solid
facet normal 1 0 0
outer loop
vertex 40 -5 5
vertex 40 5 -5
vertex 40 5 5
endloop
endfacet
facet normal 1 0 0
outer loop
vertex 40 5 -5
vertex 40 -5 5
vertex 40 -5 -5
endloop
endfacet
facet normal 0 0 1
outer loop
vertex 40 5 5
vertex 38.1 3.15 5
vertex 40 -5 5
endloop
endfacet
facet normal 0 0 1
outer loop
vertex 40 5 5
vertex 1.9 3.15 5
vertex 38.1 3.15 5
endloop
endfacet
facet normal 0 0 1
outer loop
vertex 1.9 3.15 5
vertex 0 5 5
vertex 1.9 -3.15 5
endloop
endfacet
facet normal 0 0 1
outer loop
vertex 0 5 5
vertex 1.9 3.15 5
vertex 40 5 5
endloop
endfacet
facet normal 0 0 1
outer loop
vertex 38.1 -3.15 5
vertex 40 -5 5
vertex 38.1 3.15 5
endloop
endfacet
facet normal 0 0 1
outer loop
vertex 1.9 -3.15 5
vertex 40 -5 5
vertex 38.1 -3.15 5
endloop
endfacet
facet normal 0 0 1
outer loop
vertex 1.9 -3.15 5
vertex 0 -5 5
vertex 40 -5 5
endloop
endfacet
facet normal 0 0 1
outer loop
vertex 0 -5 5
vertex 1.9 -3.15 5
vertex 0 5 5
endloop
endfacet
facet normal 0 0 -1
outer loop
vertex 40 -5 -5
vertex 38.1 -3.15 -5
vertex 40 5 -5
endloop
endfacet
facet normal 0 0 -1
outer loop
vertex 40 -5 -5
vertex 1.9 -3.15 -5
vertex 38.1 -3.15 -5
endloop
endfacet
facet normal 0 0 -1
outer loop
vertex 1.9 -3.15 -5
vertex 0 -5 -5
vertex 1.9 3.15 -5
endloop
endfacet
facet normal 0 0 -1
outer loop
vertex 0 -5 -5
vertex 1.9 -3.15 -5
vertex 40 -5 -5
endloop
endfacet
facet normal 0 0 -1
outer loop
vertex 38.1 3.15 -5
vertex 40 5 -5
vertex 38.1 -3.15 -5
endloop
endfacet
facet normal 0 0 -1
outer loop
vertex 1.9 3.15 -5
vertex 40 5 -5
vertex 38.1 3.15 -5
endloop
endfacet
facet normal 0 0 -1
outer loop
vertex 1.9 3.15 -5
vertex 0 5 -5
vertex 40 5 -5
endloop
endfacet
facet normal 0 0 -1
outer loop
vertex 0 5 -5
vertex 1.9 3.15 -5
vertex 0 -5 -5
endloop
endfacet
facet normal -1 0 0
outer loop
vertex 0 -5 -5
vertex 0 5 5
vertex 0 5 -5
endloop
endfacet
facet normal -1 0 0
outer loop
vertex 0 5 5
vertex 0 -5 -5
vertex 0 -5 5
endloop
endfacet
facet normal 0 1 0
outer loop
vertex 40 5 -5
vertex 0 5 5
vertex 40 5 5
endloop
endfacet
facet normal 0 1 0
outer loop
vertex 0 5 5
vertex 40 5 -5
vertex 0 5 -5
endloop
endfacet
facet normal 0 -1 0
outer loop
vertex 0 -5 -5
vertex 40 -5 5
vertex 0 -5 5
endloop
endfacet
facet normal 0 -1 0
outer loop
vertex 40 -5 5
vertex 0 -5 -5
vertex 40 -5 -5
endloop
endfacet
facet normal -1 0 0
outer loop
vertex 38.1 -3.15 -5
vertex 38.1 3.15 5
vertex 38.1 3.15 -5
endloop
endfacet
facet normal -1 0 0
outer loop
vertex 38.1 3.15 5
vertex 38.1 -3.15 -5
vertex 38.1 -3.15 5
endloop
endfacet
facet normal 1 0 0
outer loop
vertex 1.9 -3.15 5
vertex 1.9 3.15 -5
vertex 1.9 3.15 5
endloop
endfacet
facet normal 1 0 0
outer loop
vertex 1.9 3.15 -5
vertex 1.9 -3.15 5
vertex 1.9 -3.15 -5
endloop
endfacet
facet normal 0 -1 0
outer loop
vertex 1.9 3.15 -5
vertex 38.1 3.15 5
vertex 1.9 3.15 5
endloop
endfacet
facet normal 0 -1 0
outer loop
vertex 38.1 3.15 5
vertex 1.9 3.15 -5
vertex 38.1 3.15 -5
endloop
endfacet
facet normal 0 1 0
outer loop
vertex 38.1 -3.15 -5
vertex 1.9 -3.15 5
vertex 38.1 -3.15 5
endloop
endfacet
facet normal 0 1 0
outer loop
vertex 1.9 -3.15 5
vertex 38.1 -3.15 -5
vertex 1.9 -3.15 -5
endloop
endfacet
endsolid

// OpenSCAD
aligner();

module aligner(spaces=4){
  translate([spaces*5,0,0]) difference(){
    cube([10*spaces,10,10], center=true);
    cube([10*spaces-3.8,6.3,20], center=true);
//    %for(X=[0:1:spaces-1]) translate([6*X+5,0,-10]) cylinder(d=5.8,h=10);
  }
}
